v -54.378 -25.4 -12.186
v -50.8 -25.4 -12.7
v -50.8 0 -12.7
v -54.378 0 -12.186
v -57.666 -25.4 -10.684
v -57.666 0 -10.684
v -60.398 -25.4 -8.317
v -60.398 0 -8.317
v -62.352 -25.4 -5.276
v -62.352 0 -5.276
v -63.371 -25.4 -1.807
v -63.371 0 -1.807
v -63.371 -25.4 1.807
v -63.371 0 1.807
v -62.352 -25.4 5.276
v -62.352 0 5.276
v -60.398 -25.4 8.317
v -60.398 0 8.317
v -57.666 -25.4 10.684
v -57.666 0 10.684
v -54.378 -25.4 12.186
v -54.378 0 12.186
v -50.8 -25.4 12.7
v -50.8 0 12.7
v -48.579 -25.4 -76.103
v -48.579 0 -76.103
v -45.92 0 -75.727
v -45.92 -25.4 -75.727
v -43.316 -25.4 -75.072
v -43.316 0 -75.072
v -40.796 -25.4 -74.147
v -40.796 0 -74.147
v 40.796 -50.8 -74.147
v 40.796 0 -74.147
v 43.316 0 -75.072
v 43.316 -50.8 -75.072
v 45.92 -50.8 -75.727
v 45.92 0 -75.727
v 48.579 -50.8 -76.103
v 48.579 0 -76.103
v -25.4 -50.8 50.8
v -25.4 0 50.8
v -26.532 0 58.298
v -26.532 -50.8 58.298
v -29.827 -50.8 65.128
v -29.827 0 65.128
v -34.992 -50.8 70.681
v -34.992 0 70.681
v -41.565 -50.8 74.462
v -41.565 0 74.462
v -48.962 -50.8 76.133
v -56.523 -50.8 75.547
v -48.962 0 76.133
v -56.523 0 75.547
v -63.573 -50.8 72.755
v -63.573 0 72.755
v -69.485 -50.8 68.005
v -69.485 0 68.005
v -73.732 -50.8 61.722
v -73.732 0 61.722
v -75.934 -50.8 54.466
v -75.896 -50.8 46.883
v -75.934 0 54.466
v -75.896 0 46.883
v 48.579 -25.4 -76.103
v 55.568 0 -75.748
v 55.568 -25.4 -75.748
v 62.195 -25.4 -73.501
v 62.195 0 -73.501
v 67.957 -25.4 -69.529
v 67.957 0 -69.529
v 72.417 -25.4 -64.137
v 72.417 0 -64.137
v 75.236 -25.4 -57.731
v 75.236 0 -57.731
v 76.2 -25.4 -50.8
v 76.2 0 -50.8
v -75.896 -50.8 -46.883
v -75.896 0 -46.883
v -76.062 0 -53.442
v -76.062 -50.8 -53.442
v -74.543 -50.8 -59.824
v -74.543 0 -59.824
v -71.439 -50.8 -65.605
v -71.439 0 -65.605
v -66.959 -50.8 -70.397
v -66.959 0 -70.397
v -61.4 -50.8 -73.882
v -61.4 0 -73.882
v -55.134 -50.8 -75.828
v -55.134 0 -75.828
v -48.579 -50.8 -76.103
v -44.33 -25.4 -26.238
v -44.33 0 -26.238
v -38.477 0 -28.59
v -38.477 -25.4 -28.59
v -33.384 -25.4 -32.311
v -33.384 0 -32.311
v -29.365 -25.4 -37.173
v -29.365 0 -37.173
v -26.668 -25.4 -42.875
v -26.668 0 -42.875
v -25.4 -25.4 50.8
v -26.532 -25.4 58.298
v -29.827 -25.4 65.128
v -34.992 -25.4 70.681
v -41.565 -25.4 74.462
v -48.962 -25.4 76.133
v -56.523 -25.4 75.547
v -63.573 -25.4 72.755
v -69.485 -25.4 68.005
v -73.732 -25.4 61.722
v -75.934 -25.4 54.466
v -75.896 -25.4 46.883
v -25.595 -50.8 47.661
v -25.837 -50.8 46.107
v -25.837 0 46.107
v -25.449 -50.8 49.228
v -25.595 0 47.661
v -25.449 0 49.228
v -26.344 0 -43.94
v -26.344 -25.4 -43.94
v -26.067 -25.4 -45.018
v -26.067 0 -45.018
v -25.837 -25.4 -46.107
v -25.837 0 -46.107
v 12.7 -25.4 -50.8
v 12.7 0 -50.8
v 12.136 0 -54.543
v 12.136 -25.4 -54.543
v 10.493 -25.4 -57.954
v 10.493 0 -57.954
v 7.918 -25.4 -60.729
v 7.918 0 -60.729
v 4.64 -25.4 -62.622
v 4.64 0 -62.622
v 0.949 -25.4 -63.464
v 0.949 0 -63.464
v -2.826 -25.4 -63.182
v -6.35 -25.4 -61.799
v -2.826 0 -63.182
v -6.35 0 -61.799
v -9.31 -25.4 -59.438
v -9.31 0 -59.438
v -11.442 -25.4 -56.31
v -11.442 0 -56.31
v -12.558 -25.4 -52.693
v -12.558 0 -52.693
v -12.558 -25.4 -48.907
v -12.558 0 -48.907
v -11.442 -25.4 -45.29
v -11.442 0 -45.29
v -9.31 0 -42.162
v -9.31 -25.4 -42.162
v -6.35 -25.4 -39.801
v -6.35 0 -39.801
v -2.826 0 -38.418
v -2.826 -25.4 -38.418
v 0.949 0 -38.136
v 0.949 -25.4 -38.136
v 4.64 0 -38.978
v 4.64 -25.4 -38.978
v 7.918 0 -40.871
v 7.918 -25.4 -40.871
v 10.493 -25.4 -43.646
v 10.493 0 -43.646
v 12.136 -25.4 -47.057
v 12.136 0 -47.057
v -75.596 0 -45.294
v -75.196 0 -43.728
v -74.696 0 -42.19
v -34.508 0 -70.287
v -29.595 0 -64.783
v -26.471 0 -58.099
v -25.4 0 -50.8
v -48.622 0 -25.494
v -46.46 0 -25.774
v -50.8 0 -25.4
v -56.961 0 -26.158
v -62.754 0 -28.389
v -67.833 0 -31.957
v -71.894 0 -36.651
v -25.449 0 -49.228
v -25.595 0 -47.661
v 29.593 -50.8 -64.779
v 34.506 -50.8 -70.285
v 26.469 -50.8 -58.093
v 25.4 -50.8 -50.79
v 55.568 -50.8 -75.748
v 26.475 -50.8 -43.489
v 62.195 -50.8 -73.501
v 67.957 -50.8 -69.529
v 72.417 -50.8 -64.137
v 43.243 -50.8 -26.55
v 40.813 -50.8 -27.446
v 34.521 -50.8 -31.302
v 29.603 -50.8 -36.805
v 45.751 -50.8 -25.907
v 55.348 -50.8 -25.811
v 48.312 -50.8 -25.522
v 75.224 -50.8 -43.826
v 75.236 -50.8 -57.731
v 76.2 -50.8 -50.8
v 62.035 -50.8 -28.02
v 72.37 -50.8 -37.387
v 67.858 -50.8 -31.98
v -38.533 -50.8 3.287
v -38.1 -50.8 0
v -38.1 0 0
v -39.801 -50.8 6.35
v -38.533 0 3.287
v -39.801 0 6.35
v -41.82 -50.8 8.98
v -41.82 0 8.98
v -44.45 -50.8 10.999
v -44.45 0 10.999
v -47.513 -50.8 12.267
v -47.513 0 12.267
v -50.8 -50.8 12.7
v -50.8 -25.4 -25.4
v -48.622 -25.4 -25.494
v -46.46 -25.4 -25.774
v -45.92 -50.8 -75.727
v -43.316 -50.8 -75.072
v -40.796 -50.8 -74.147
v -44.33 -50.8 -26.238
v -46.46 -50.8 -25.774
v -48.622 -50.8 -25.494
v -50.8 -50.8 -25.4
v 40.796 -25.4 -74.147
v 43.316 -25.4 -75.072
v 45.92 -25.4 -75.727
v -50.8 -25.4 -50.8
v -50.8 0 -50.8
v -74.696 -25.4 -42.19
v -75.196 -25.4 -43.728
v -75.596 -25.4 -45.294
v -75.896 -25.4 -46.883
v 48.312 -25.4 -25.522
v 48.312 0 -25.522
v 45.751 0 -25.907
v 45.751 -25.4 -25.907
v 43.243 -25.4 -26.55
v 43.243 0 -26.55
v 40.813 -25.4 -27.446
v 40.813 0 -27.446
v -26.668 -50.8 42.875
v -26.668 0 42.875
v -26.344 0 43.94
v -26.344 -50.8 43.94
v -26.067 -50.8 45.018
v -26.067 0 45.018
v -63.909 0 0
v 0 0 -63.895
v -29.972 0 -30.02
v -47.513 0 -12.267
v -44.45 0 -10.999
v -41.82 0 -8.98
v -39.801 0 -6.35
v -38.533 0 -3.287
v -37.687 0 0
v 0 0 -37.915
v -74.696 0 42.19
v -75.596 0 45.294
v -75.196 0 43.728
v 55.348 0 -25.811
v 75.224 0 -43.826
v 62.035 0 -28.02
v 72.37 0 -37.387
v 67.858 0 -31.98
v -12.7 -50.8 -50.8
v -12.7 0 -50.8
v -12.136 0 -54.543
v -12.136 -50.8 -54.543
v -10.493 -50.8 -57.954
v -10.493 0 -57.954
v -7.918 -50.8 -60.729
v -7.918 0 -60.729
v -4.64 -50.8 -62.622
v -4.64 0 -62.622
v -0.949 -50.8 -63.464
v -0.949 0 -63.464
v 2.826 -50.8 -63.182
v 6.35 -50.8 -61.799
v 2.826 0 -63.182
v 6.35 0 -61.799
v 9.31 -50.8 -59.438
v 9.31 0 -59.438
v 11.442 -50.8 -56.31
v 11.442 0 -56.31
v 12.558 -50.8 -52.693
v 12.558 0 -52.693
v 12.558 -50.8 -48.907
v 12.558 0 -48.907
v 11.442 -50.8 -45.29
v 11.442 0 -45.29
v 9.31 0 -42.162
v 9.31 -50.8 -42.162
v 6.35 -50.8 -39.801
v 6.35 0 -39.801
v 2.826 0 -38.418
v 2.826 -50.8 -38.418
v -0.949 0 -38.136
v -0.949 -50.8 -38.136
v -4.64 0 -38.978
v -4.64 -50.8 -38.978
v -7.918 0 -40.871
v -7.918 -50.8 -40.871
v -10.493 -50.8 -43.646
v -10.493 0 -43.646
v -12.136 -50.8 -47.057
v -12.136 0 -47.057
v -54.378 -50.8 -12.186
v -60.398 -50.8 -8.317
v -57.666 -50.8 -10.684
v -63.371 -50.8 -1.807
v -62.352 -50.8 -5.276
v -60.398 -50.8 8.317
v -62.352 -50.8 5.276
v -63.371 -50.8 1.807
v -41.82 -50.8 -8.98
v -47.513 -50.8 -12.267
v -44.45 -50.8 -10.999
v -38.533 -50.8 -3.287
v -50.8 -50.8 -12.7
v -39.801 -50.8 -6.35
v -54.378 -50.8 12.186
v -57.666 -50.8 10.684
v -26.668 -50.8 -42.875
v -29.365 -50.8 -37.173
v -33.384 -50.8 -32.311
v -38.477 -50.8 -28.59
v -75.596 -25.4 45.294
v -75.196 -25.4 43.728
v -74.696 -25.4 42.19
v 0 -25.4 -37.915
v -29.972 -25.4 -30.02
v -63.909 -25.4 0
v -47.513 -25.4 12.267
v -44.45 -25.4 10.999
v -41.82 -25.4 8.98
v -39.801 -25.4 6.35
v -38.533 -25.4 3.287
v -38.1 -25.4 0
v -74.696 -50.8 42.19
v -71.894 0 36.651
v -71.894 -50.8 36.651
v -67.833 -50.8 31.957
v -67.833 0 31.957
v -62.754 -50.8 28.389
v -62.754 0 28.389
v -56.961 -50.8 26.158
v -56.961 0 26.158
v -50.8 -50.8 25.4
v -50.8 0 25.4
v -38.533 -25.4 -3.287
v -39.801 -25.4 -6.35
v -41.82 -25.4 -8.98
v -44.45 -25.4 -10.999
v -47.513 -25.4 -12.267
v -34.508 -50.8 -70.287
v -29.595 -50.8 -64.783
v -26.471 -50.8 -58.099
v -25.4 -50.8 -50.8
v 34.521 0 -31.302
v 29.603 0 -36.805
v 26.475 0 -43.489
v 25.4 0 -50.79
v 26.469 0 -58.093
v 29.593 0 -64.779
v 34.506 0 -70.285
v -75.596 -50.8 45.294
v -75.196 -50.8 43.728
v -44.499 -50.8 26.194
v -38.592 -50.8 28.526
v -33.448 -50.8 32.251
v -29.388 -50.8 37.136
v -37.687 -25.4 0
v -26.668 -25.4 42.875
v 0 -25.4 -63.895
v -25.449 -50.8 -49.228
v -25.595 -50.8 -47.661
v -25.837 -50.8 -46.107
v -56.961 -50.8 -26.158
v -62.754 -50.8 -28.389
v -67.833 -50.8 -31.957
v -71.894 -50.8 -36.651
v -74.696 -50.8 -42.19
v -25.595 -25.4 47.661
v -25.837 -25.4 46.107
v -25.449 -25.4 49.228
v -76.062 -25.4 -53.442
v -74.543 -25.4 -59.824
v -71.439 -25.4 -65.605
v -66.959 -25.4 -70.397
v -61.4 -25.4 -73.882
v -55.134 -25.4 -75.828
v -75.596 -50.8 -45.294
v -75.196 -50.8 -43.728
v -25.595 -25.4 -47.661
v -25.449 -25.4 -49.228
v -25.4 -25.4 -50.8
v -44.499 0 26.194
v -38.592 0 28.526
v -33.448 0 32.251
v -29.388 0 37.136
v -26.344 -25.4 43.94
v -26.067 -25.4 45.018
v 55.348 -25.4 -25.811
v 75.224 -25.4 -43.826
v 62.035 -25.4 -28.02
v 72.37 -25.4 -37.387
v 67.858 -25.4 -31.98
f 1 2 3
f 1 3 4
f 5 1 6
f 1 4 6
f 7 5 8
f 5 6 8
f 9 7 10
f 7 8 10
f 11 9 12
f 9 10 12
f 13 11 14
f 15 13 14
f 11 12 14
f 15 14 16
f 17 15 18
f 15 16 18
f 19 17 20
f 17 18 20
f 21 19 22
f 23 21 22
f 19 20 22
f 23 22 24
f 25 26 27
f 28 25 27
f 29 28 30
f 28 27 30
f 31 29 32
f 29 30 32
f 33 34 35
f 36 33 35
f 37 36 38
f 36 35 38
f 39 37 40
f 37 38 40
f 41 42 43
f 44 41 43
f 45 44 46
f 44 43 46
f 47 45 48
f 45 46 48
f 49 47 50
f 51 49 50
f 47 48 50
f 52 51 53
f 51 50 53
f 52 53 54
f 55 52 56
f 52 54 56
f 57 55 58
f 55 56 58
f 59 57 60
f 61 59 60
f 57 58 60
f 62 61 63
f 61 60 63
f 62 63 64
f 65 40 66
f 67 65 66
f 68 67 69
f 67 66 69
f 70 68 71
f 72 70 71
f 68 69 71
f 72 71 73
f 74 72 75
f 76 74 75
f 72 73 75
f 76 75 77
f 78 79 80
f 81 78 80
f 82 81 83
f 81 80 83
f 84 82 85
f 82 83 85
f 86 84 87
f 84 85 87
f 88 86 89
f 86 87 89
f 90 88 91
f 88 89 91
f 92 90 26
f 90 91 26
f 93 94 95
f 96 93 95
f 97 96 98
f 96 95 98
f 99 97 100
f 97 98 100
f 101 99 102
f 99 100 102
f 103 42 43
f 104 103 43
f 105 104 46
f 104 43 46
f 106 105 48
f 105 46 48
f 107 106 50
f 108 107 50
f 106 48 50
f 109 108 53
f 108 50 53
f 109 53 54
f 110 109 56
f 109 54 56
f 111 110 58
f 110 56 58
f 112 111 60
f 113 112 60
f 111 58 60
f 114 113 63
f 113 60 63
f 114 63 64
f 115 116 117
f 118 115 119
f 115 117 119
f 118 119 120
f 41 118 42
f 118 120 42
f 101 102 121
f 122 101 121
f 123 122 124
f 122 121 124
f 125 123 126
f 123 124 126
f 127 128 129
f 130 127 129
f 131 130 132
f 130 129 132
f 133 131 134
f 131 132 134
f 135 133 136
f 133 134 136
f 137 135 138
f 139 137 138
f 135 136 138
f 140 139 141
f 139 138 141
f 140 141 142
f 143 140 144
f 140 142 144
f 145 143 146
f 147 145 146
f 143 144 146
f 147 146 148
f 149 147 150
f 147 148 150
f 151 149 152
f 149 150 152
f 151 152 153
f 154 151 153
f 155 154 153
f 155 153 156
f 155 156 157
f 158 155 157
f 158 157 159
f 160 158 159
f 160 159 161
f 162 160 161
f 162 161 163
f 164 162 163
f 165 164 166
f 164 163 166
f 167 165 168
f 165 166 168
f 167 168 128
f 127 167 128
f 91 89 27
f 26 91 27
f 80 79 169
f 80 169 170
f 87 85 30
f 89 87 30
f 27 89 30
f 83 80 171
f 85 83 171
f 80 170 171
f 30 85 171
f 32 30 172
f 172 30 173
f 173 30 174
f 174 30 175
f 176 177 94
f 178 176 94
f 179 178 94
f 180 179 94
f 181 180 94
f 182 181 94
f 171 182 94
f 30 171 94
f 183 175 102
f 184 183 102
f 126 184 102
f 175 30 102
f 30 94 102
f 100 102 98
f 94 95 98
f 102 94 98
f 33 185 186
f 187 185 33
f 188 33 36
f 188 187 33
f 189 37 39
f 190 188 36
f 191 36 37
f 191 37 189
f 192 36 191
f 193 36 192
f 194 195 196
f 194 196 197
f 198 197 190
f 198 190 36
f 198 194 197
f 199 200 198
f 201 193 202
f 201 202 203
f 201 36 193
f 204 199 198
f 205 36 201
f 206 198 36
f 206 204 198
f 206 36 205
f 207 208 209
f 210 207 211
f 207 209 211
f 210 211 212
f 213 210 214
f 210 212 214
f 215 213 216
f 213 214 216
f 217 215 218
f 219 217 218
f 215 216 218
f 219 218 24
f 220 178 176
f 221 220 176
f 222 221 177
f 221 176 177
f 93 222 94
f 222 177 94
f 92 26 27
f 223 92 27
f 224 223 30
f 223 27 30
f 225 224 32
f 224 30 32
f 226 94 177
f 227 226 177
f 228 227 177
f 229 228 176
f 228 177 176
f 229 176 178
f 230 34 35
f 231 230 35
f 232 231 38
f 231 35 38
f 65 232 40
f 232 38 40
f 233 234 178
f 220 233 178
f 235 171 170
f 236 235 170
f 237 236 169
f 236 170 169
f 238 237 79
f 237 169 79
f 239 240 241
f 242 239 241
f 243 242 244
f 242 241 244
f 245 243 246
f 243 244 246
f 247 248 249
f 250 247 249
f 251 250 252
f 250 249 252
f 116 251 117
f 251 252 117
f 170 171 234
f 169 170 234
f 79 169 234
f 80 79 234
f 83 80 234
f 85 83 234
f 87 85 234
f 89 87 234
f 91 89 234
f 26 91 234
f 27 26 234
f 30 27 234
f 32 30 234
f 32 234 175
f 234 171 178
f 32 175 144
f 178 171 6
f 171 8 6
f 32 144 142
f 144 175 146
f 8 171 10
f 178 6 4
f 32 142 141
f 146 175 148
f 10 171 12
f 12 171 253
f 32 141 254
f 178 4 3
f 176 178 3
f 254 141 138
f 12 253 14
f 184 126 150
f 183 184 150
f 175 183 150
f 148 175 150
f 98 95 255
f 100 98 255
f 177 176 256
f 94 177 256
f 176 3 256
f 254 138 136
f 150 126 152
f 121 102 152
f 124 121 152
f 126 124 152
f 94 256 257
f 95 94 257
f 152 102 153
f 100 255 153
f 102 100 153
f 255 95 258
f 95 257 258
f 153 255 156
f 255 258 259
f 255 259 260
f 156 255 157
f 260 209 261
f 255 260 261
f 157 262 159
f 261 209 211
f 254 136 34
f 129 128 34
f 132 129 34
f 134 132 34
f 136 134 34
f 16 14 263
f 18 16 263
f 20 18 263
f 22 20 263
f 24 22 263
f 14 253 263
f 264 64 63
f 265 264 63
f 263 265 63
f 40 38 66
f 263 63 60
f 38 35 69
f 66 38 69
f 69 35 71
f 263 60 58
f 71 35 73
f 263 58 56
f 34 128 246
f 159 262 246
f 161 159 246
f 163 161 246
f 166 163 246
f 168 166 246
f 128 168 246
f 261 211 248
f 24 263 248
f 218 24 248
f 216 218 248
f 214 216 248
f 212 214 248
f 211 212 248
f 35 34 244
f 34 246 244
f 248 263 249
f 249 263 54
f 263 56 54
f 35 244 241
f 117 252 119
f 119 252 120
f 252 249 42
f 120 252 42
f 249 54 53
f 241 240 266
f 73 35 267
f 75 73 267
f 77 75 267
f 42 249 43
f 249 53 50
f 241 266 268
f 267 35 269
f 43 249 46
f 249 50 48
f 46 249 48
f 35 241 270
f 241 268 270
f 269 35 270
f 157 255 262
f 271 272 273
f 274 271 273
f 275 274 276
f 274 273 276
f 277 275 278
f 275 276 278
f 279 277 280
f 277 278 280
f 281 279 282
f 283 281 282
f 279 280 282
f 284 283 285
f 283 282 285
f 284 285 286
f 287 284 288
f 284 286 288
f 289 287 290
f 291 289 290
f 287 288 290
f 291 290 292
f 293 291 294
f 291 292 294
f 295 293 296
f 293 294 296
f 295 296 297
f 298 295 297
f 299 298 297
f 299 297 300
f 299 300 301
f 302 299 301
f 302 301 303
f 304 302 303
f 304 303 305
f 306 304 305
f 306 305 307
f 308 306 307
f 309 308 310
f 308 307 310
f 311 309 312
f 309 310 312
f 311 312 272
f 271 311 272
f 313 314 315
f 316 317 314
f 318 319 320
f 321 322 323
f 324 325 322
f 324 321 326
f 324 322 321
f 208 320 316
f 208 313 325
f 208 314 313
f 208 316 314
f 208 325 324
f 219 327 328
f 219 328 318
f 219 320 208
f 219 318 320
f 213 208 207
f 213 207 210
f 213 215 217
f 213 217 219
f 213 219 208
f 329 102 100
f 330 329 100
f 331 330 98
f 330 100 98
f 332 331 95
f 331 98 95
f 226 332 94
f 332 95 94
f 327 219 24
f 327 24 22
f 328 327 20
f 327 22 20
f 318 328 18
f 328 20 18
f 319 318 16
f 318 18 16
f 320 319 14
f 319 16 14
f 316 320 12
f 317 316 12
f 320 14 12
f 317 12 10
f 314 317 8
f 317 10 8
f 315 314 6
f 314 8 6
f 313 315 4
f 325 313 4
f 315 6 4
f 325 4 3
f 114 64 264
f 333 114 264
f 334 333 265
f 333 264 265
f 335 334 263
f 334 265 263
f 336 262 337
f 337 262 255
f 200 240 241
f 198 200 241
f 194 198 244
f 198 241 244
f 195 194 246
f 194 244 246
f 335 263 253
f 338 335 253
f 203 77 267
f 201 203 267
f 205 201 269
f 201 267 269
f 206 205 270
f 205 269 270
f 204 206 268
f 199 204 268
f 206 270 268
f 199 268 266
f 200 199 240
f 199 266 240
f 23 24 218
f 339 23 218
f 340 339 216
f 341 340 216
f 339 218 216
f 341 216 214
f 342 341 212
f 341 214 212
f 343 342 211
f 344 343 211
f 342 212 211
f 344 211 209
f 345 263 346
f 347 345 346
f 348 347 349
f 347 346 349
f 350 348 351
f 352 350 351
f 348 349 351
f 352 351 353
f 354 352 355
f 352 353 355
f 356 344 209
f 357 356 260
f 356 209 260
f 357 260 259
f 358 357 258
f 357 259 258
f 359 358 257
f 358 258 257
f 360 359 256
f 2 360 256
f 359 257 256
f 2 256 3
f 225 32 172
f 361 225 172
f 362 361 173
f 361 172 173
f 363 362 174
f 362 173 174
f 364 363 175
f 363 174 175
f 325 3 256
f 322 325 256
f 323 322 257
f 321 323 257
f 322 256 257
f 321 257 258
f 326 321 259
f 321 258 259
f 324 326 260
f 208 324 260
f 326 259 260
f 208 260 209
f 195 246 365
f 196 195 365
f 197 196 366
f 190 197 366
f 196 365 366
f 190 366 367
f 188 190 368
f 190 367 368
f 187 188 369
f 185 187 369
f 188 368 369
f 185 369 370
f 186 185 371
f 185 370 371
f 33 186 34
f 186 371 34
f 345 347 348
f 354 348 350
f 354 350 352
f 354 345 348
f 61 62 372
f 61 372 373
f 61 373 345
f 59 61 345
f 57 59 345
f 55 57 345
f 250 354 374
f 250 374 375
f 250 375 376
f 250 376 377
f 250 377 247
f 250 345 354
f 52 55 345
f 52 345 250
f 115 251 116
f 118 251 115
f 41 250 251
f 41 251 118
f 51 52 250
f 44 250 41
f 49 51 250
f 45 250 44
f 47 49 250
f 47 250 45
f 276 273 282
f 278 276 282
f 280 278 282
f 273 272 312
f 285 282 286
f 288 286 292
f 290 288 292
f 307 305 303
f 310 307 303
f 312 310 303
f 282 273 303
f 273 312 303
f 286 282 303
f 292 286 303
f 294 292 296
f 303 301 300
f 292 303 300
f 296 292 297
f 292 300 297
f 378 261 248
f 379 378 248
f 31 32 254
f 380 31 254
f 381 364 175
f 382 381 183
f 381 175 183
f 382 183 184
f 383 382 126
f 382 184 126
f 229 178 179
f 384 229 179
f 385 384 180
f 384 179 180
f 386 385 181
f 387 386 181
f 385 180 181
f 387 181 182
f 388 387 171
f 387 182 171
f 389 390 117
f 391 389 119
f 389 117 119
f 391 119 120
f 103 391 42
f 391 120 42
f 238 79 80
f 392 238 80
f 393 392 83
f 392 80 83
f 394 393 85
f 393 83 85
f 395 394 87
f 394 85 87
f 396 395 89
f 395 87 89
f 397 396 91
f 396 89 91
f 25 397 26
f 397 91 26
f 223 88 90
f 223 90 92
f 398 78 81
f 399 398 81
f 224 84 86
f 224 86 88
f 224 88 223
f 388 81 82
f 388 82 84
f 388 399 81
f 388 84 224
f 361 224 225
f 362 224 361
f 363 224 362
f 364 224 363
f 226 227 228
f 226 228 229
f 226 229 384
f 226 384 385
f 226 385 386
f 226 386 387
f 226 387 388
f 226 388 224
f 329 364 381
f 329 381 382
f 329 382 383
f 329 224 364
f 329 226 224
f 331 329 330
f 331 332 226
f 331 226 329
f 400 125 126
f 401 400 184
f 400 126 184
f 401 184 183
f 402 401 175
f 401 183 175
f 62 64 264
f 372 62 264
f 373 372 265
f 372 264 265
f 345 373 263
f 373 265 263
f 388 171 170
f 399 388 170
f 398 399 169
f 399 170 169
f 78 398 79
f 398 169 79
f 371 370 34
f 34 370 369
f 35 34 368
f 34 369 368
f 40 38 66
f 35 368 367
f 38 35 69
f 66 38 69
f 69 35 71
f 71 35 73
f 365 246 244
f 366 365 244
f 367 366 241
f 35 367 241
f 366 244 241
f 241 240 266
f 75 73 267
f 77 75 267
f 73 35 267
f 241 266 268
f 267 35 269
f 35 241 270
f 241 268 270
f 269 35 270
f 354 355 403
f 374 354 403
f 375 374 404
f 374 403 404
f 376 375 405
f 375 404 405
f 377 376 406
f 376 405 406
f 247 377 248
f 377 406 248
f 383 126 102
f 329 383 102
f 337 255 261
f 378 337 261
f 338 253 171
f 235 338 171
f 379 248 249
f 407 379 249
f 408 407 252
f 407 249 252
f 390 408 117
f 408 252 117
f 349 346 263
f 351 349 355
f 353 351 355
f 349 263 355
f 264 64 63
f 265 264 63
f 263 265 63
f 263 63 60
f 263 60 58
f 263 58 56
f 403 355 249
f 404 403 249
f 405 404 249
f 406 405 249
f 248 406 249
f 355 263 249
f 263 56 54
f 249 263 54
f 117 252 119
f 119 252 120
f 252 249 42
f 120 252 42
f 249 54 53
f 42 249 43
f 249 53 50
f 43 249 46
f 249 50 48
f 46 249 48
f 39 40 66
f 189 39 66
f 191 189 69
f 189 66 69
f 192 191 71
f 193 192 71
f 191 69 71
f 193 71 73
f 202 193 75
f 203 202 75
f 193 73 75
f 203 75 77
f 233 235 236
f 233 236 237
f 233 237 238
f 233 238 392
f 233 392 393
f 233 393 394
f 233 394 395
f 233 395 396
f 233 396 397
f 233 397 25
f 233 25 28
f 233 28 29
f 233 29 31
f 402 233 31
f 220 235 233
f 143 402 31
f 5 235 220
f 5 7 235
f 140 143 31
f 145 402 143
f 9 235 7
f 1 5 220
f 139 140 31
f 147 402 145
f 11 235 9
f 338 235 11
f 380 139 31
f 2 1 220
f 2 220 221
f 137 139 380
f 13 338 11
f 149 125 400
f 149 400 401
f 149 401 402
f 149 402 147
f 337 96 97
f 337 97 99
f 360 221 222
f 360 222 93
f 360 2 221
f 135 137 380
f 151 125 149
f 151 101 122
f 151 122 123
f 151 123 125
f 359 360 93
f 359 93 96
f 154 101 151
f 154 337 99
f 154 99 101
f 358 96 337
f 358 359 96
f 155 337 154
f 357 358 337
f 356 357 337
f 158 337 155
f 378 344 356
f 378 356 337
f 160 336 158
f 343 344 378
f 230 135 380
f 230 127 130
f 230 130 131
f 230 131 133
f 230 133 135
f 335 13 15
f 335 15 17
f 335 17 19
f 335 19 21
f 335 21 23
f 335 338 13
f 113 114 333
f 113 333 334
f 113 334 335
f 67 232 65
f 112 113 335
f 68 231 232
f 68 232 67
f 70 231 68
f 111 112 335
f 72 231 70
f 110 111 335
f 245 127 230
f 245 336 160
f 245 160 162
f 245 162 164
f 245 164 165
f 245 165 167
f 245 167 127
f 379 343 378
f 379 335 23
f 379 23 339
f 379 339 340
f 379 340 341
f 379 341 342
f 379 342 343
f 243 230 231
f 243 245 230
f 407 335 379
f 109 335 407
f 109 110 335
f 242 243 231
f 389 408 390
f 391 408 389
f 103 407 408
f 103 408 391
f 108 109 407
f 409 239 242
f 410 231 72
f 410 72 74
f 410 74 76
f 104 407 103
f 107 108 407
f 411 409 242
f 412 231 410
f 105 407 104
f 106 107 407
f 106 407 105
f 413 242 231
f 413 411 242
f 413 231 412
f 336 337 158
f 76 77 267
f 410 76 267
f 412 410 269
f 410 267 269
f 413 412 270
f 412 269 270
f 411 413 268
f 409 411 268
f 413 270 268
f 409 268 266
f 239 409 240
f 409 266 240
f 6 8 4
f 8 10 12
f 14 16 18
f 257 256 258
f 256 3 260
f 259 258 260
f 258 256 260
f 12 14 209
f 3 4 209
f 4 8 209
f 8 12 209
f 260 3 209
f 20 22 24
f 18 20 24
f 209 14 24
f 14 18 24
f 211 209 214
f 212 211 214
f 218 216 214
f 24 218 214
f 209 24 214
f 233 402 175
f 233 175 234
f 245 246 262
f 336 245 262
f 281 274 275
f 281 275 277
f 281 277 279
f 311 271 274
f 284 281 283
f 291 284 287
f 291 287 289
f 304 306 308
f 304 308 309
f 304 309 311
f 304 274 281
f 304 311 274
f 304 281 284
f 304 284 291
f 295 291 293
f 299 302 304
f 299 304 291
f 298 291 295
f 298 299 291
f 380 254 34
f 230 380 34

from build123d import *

# Parameters (mm, degrees)
F1_DEPTH = 50.8
F2_DEPTH = 25.4


with BuildPart() as f1:
    # F0 (on Front) → F1 (new body)
    with BuildSketch(Plane.XZ):
        with BuildLine():
            ThreePointArc((-75.8961302399, 46.8828266589), (-75.40831074, 44.5078586694), (-74.6962701194, 42.1902221643))
            Line((-74.6962701194, 42.1902221643), (-75.8961302399, 46.8828266589))
        make_face()
        with BuildLine():
            Line((-25.8372618241, 46.1072712881), (-26.6680064828, 42.8749202601))
            ThreePointArc((-26.6680064828, 42.8749202601), (-26.1994879465, 44.4774366984), (-25.8372618241, 46.1072712881))
        make_face()
        with BuildLine():
            ThreePointArc((-74.6962701194, 42.1902221643), (-65.4025963954, 30.0172143707), (-50.8, 25.4))
            ThreePointArc((-50.8, 25.4), (-35.9026348872, 30.2274816151), (-26.6680064828, 42.8749202601))
            Line((-26.6680064828, 42.8749202601), (-25.8372618241, 46.1072712881))
            ThreePointArc((-25.8372618241, 46.1072712881), (-25.5095517075, 48.4434717981), (-25.4, 50.8))
            ThreePointArc((-25.4, 50.8), (-52.7644709094, 76.1239186155), (-75.8961302399, 46.8828266589))
            Line((-75.8961302399, 46.8828266589), (-74.6962701194, 42.1902221643))
        make_face()
    extrude(amount=F1_DEPTH)


with BuildPart() as f1b:
    # F0 (on Front) → F1, piece 2 (new body)
    with BuildSketch(Plane.XZ):
        with BuildLine():
            Line((-75.8961302399, -46.8828266589), (-74.6962701194, -42.1902221643))
            ThreePointArc((-74.6962701194, -42.1902221643), (-75.40831074, -44.5078586694), (-75.8961302399, -46.8828266589))
        make_face()
        with BuildLine():
            Line((-40.7956430213, -74.1467951), (-48.578768387, -76.1026901756))
            ThreePointArc((-48.578768387, -76.1026901756), (-44.6094721154, -75.4340691829), (-40.7956430213, -74.1467951))
        make_face()
        with BuildLine():
            Line((-50.8, -50.8), (-50.8, -25.4))
            ThreePointArc((-50.8, -25.4), (-65.4025963954, -30.0172143707), (-74.6962701194, -42.1902221643))
            Line((-74.6962701194, -42.1902221643), (-75.8961302399, -46.8828266589))
            ThreePointArc((-75.8961302399, -46.8828266589), (-69.3543890436, -68.1463150905), (-48.578768387, -76.1026901756))
            Line((-48.578768387, -76.1026901756), (-40.7956430213, -74.1467951))
            ThreePointArc((-40.7956430213, -74.1467951), (-29.5953935752, -64.7830134939), (-25.4, -50.8))
            Line((-25.4, -50.8), (-50.8, -50.8))
        make_face()
        with BuildLine():
            ThreePointArc((-44.3299344082, -26.2378695705), (-47.537954086, -25.6103383021), (-50.8, -25.4))
            Line((-50.8, -25.4), (-50.8, -50.8))
            Line((-50.8, -50.8), (-25.4, -50.8))
            ThreePointArc((-25.4, -50.8), (-25.5095517075, -48.4434717981), (-25.8372618241, -46.1072712881))
            Line((-25.8372618241, -46.1072712881), (-26.6680064828, -42.8749202601))
            ThreePointArc((-26.6680064828, -42.8749202601), (-33.3839335859, -32.3110673467), (-44.3299344082, -26.2378695705))
        make_face()
    extrude(amount=F1_DEPTH)


with BuildPart() as f1c:
    # F0 (on Front) → F1, piece 3 (new body)
    with BuildSketch(Plane.XZ):
        with BuildLine():
            ThreePointArc((48.3117699414, -25.5221695714), (44.4887363609, -26.196586593), (40.8131288755, -27.4457197682))
            Line((40.8131288755, -27.4457197682), (48.3117699414, -25.5221695714))
        make_face()
        with BuildLine():
            Line((48.578768387, -76.1026901756), (40.7956430213, -74.1467951))
            ThreePointArc((40.7956430213, -74.1467951), (44.6094721154, -75.4340691829), (48.578768387, -76.1026901756))
        make_face()
        with BuildLine():
            Line((48.3117699414, -25.5221695714), (40.8131288755, -27.4457197682))
            ThreePointArc((40.8131288755, -27.4457197682), (29.6006305924, -36.809048041), (25.4, -50.8))
            ThreePointArc((25.4, -50.8), (29.5953935752, -64.7830134939), (40.7956430213, -74.1467951))
            Line((40.7956430213, -74.1467951), (48.578768387, -76.1026901756))
            ThreePointArc((48.578768387, -76.1026901756), (67.957224674, -69.5293791004), (76.2, -50.8))
            ThreePointArc((76.2, -50.8), (67.8581205956, -31.980315578), (48.3117699414, -25.5221695714))
        make_face()
    extrude(amount=F1_DEPTH)


with BuildPart() as f1d:
    # F0 (on Front) → F1, piece 4 (new body)
    with BuildSketch(Plane.XZ):
        with BuildLine():
            Line((-50.8, 0), (-50.8, 12.7))
            ThreePointArc((-50.8, 12.7), (-63.5, 0), (-50.8, -12.7))
            Line((-50.8, -12.7), (-50.8, 0))
        make_face()
        with BuildLine():
            ThreePointArc((-38.1, 0), (-41.8197438789, 8.9802561211), (-50.8, 12.7))
            Line((-50.8, 12.7), (-50.8, 0))
            Line((-50.8, 0), (-50.8, -12.7))
            ThreePointArc((-50.8, -12.7), (-41.8197438789, -8.9802561211), (-38.1, 0))
        make_face()
    extrude(amount=F1_DEPTH)


with BuildPart() as f1e:
    # F0 (on Front) → F1, piece 5 (new body)
    with BuildSketch(Plane.XZ):
        with BuildLine():
            ThreePointArc((12.7, -50.8), (0, -38.1), (-12.7, -50.8))
            Line((-12.7, -50.8), (0, -50.8))
            Line((0, -50.8), (12.7, -50.8))
        make_face()
        with BuildLine():
            Line((0, -50.8), (-12.7, -50.8))
            ThreePointArc((-12.7, -50.8), (0, -63.5), (12.7, -50.8))
            Line((12.7, -50.8), (0, -50.8))
        make_face()
    extrude(amount=F1_DEPTH)


with BuildPart() as f2:
    # F0 (on Front) → F2 (new body)
    with BuildSketch(Plane.XZ):
        with BuildLine():
            ThreePointArc((-26.6680064828, 42.8749202601), (-35.9026348872, 30.2274816151), (-50.8, 25.4))
            Line((-50.8, 25.4), (-50.8, 12.7))
            ThreePointArc((-50.8, 12.7), (-41.8197438789, 8.9802561211), (-38.1, 0))
            ThreePointArc((-38.1, 0), (-41.8197438789, -8.9802561211), (-50.8, -12.7))
            Line((-50.8, -12.7), (-50.8, -25.4))
            ThreePointArc((-50.8, -25.4), (-47.537954086, -25.6103383021), (-44.3299344082, -26.2378695705))
            Line((-44.3299344082, -26.2378695705), (-29.9718351261, -30.0200270016))
            Line((-29.9718351261, -30.0200270016), (-37.6872648139, 0))
            Line((-37.6872648139, 0), (-26.6680064828, 42.8749202601))
        make_face()
        with BuildLine():
            Line((-50.8, 12.7), (-50.8, 25.4))
            ThreePointArc((-50.8, 25.4), (-65.4025963954, 30.0172143707), (-74.6962701194, 42.1902221643))
            Line((-74.6962701194, 42.1902221643), (-63.9085795936, 0))
            Line((-63.9085795936, 0), (-74.6962701194, -42.1902221643))
            ThreePointArc((-74.6962701194, -42.1902221643), (-65.4025963954, -30.0172143707), (-50.8, -25.4))
            Line((-50.8, -25.4), (-50.8, -12.7))
            ThreePointArc((-50.8, -12.7), (-63.5, 0), (-50.8, 12.7))
        make_face()
        with BuildLine():
            ThreePointArc((-74.6962701194, 42.1902221643), (-65.4025963954, 30.0172143707), (-50.8, 25.4))
            ThreePointArc((-50.8, 25.4), (-35.9026348872, 30.2274816151), (-26.6680064828, 42.8749202601))
            Line((-26.6680064828, 42.8749202601), (-25.8372618241, 46.1072712881))
            ThreePointArc((-25.8372618241, 46.1072712881), (-25.5095517075, 48.4434717981), (-25.4, 50.8))
            ThreePointArc((-25.4, 50.8), (-52.7644709094, 76.1239186155), (-75.8961302399, 46.8828266589))
            Line((-75.8961302399, 46.8828266589), (-74.6962701194, 42.1902221643))
        make_face()
        with BuildLine():
            ThreePointArc((-75.8961302399, 46.8828266589), (-75.40831074, 44.5078586694), (-74.6962701194, 42.1902221643))
            Line((-74.6962701194, 42.1902221643), (-75.8961302399, 46.8828266589))
        make_face()
        with BuildLine():
            Line((-25.8372618241, 46.1072712881), (-26.6680064828, 42.8749202601))
            ThreePointArc((-26.6680064828, 42.8749202601), (-26.1994879465, 44.4774366984), (-25.8372618241, 46.1072712881))
        make_face()
        with BuildLine():
            Line((-50.8, -50.8), (-50.8, -25.4))
            ThreePointArc((-50.8, -25.4), (-65.4025963954, -30.0172143707), (-74.6962701194, -42.1902221643))
            Line((-74.6962701194, -42.1902221643), (-75.8961302399, -46.8828266589))
            ThreePointArc((-75.8961302399, -46.8828266589), (-69.3543890436, -68.1463150905), (-48.578768387, -76.1026901756))
            Line((-48.578768387, -76.1026901756), (-40.7956430213, -74.1467951))
            ThreePointArc((-40.7956430213, -74.1467951), (-29.5953935752, -64.7830134939), (-25.4, -50.8))
            Line((-25.4, -50.8), (-50.8, -50.8))
        make_face()
        with BuildLine():
            Line((-75.8961302399, -46.8828266589), (-74.6962701194, -42.1902221643))
            ThreePointArc((-74.6962701194, -42.1902221643), (-75.40831074, -44.5078586694), (-75.8961302399, -46.8828266589))
        make_face()
        with BuildLine():
            Line((0, -37.9150970049), (-29.9718351261, -30.0200270016))
            Line((-29.9718351261, -30.0200270016), (-26.6680064828, -42.8749202601))
            ThreePointArc((-26.6680064828, -42.8749202601), (-26.1994879465, -44.4774366984), (-25.8372618241, -46.1072712881))
            ThreePointArc((-25.8372618241, -46.1072712881), (-25.5095517075, -48.4434717981), (-25.4, -50.8))
            Line((-25.4, -50.8), (-12.7, -50.8))
            ThreePointArc((-12.7, -50.8), (0, -38.1), (12.7, -50.8))
            Line((12.7, -50.8), (25.4, -50.8))
            ThreePointArc((25.4, -50.8), (29.6006305924, -36.809048041), (40.8131288755, -27.4457197682))
            Line((40.8131288755, -27.4457197682), (0, -37.9150970049))
        make_face()
        with BuildLine():
            Line((-26.6680064828, -42.8749202601), (-29.9718351261, -30.0200270016))
            Line((-29.9718351261, -30.0200270016), (-44.3299344082, -26.2378695705))
            ThreePointArc((-44.3299344082, -26.2378695705), (-33.3839335859, -32.3110673467), (-26.6680064828, -42.8749202601))
        make_face()
        with BuildLine():
            Line((-12.7, -50.8), (-25.4, -50.8))
            ThreePointArc((-25.4, -50.8), (-29.5953935752, -64.7830134939), (-40.7956430213, -74.1467951))
            Line((-40.7956430213, -74.1467951), (0, -63.8948726986))
            Line((0, -63.8948726986), (40.7956430213, -74.1467951))
            ThreePointArc((40.7956430213, -74.1467951), (29.5953935752, -64.7830134939), (25.4, -50.8))
            Line((25.4, -50.8), (12.7, -50.8))
            ThreePointArc((12.7, -50.8), (0, -63.5), (-12.7, -50.8))
        make_face()
        with BuildLine():
            Line((-40.7956430213, -74.1467951), (-48.578768387, -76.1026901756))
            ThreePointArc((-48.578768387, -76.1026901756), (-44.6094721154, -75.4340691829), (-40.7956430213, -74.1467951))
        make_face()
        with BuildLine():
            Line((48.3117699414, -25.5221695714), (40.8131288755, -27.4457197682))
            ThreePointArc((40.8131288755, -27.4457197682), (29.6006305924, -36.809048041), (25.4, -50.8))
            ThreePointArc((25.4, -50.8), (29.5953935752, -64.7830134939), (40.7956430213, -74.1467951))
            Line((40.7956430213, -74.1467951), (48.578768387, -76.1026901756))
            ThreePointArc((48.578768387, -76.1026901756), (67.957224674, -69.5293791004), (76.2, -50.8))
            ThreePointArc((76.2, -50.8), (67.8581205956, -31.980315578), (48.3117699414, -25.5221695714))
        make_face()
        with BuildLine():
            ThreePointArc((48.3117699414, -25.5221695714), (44.4887363609, -26.196586593), (40.8131288755, -27.4457197682))
            Line((40.8131288755, -27.4457197682), (48.3117699414, -25.5221695714))
        make_face()
        with BuildLine():
            Line((48.578768387, -76.1026901756), (40.7956430213, -74.1467951))
            ThreePointArc((40.7956430213, -74.1467951), (44.6094721154, -75.4340691829), (48.578768387, -76.1026901756))
        make_face()
    extrude(amount=F2_DEPTH)


solid = Compound([f1.part, f1b.part, f1c.part, f1d.part, f1e.part, f2.part])
